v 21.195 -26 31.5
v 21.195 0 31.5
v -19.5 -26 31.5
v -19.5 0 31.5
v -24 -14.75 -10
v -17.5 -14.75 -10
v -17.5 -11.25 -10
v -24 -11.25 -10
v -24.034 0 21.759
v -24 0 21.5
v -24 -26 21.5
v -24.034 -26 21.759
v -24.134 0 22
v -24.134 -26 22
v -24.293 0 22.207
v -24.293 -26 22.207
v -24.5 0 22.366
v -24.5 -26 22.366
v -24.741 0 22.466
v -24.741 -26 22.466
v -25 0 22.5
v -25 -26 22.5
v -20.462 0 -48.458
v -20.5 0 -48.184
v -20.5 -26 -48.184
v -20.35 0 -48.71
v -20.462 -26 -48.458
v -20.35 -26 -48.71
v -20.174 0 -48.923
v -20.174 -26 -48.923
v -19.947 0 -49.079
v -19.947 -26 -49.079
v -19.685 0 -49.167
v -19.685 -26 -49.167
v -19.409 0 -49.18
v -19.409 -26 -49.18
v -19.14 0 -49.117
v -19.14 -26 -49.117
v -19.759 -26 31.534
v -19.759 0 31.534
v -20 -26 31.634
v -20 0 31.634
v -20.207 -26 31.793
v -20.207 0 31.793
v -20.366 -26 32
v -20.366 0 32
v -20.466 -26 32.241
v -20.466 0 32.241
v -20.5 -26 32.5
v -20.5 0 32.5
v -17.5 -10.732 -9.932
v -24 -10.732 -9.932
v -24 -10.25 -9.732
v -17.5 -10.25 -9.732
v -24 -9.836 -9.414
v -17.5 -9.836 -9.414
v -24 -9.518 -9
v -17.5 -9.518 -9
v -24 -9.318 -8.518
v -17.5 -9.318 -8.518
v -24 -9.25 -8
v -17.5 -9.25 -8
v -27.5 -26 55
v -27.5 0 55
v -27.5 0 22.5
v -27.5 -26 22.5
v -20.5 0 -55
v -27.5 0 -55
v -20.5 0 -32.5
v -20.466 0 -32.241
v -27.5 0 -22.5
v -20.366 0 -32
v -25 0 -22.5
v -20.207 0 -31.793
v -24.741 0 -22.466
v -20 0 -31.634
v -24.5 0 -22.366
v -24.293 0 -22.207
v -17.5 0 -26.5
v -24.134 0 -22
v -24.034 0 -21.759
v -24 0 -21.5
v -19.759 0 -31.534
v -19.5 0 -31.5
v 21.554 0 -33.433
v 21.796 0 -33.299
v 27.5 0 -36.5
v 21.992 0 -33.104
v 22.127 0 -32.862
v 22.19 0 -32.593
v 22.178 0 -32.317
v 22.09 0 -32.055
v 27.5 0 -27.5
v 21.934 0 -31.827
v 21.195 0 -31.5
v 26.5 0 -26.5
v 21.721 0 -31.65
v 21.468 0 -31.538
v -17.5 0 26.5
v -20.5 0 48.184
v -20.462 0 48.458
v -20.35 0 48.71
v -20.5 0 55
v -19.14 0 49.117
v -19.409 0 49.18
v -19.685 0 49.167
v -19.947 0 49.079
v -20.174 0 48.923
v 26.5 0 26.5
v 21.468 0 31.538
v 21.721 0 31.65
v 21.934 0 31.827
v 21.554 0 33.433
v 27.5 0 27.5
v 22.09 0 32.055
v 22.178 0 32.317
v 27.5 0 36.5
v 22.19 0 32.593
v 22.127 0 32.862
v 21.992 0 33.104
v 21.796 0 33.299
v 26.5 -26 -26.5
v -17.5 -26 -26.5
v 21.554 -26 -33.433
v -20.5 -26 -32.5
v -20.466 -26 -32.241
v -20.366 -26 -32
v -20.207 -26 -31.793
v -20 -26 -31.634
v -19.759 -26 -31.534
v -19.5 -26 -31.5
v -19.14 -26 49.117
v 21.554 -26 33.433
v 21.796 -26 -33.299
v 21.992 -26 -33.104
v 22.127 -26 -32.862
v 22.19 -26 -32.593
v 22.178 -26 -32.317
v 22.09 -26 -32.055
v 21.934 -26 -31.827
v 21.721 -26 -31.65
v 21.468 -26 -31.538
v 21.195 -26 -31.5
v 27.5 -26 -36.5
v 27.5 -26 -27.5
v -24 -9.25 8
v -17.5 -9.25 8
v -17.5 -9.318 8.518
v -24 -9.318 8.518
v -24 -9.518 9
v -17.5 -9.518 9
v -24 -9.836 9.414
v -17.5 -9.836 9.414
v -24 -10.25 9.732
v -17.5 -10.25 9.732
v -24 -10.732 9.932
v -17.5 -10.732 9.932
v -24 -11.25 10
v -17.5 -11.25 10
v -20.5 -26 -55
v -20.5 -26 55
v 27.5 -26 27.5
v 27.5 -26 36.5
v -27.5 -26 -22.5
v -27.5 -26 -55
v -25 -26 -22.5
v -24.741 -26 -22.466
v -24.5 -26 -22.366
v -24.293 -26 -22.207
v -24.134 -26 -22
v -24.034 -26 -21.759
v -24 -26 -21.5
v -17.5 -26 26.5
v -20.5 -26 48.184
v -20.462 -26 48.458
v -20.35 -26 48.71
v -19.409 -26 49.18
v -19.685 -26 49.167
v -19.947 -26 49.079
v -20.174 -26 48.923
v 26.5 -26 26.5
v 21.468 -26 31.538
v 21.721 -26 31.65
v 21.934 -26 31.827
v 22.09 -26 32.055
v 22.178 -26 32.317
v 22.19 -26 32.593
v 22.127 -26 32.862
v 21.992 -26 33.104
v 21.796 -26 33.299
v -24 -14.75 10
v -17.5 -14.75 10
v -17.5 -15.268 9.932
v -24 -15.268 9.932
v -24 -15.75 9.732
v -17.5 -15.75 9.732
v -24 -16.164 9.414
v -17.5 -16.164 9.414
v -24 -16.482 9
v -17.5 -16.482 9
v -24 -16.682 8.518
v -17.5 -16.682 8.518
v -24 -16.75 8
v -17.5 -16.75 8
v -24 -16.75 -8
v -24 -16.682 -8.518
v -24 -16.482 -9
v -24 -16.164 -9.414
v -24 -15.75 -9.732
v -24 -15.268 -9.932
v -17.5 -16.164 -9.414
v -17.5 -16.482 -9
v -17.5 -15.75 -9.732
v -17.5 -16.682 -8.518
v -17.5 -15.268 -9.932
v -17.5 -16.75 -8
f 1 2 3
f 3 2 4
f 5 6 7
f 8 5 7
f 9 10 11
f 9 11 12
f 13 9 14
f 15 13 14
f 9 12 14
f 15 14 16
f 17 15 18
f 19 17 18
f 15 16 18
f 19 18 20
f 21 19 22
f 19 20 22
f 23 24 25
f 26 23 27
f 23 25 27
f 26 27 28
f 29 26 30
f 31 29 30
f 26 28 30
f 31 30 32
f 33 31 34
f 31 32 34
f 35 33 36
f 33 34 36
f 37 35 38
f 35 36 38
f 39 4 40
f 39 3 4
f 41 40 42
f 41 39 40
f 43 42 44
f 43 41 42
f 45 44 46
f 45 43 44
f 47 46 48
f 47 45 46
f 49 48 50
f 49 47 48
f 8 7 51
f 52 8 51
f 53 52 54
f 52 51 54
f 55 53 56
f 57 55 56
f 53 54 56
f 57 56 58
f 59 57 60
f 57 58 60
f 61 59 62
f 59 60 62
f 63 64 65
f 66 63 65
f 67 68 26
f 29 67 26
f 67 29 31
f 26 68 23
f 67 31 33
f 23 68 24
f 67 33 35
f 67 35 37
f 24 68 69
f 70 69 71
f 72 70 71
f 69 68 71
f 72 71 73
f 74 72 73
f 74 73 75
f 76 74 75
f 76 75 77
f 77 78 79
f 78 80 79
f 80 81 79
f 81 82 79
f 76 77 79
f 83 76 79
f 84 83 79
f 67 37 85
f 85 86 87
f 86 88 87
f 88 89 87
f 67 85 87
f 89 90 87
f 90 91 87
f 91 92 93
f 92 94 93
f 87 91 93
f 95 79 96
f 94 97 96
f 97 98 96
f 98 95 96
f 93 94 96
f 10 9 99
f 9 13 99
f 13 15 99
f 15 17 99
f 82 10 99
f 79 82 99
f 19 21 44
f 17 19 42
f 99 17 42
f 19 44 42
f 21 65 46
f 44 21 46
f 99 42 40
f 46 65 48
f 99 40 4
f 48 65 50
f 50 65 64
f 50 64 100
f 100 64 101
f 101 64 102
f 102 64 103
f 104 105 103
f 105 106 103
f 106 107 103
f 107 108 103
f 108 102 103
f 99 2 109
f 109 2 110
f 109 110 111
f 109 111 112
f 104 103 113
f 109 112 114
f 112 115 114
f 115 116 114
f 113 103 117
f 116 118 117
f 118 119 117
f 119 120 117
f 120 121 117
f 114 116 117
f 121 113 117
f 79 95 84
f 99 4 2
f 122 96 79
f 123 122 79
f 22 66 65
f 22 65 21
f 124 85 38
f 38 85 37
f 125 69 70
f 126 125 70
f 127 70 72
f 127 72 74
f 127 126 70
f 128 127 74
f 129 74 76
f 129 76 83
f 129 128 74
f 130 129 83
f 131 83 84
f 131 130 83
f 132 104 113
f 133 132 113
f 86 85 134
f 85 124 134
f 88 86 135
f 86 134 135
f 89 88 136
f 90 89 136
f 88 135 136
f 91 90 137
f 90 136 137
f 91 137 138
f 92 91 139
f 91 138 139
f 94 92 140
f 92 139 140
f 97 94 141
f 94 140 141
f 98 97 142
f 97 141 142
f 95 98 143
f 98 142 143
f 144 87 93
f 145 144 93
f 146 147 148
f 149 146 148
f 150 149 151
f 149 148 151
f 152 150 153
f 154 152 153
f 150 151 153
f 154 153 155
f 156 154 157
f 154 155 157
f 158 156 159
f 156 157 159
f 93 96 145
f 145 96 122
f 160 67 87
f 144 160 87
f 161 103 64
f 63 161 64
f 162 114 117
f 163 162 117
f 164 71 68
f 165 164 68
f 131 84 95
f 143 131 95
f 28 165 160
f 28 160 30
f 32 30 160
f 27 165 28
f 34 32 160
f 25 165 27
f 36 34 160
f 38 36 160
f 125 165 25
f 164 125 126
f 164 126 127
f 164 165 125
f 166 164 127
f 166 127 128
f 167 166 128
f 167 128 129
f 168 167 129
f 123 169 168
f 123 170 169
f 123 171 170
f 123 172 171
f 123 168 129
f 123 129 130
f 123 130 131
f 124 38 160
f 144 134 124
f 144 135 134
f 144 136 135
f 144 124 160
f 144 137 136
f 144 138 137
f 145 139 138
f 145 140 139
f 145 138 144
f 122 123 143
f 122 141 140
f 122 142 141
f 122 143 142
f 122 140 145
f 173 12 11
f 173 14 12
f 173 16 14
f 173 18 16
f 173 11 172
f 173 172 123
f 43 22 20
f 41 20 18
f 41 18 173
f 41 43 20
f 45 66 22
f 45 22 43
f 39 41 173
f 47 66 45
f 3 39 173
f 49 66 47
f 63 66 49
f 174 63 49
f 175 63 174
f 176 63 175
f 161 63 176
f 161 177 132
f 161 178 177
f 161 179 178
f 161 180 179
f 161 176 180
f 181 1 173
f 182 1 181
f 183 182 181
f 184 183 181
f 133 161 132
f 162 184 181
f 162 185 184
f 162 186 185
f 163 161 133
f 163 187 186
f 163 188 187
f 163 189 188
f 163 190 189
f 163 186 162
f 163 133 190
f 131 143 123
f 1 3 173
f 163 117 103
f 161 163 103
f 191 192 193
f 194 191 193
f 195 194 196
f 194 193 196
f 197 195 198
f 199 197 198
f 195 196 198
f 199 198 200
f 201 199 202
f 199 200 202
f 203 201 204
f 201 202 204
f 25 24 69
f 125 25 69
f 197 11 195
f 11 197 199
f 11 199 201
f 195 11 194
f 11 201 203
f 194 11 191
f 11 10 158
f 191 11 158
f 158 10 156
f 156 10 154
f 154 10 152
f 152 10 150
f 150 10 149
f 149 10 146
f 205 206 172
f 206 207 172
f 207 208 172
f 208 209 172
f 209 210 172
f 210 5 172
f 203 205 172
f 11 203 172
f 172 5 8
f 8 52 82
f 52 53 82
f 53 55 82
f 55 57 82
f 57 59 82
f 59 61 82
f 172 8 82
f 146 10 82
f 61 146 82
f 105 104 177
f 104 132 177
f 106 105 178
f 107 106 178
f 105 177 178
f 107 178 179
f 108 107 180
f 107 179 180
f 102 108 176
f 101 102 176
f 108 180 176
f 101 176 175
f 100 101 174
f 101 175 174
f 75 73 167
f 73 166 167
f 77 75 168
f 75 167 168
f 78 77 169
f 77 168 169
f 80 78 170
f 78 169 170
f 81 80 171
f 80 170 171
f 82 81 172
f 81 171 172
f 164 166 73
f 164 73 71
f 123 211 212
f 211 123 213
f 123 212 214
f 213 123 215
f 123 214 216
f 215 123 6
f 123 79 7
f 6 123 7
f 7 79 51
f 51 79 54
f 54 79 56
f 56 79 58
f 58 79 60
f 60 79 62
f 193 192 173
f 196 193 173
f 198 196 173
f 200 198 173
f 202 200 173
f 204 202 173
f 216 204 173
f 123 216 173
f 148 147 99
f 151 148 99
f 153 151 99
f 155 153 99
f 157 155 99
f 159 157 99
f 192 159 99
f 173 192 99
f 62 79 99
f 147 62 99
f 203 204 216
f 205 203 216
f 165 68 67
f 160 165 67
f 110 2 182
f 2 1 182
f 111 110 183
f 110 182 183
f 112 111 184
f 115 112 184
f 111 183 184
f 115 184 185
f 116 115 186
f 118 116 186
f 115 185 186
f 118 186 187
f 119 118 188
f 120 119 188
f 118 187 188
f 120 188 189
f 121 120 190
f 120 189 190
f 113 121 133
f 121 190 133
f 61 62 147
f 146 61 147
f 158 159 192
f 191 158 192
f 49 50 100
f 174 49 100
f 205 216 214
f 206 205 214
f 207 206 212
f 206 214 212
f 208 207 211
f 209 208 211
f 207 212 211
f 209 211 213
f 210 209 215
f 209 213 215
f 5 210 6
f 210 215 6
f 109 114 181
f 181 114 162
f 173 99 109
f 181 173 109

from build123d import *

# Parameters (mm, degrees)
F1_DEPTH = 26
F2_R     = 1
F3_SIZE  = 1
F5_DEPTH = 6.5


with BuildPart() as f1:
    # F0 (on Front) → F1 (new body)
    with BuildSketch(Plane.XZ):
        Polygon((-27.5, -55), (-20.5, -55), (27.5, -36.5), (27.5, -26.5), (-17.5, -26.5), (-17.5, 26.5), (27.5, 26.5), (27.5, 36.5), (-20.5, 55), (-27.5, 55), (-27.5, 22.5), (-24, 22.5), (-24, -22.5), (-27.5, -22.5), align=None)
        Polygon((-20.5, -31.5), (26.5698068675, -31.5), (-20.5, -49.6414880635), align=None, mode=Mode.SUBTRACT)
        Polygon((-20.5, 31.5), (-20.5, 49.6414880635), (26.5698068675, 31.5), align=None, mode=Mode.SUBTRACT)
    extrude(amount=F1_DEPTH)

    # F2
    f2_edges = [f1.edges().sort_by_distance(p)[0] for p in [
        (-20.5, -13, 49.641488),
        (-20.5, -13, 31.5),
        (26.569807, -13, 31.5),
        (26.569807, -13, -31.5),
        (-20.5, -13, -31.5),
        (-20.5, -13, -49.641488),
        (-24, -13, -22.5),
        (-24, -13, 22.5),
    ]]
    fillet(f2_edges, radius=F2_R)

    # F3
    f3_edges = [f1.edges().sort_by_distance(p)[0] for p in [
        (27.5, -13, -26.5),
        (27.5, -13, 26.5),
    ]]
    chamfer(f3_edges, length=F3_SIZE)

    # F4 (on face) → F5 (cut, through all)
    with BuildSketch(Plane.YZ.offset(-17.5)):
        with BuildLine():
            ThreePointArc((-9.25, 8), (-9.8357864376, 9.4142135624), (-11.25, 10))
            Line((-11.25, 10), (-14.75, 10))
            ThreePointArc((-14.75, 10), (-16.1642135624, 9.4142135624), (-16.75, 8))
            Line((-16.75, 8), (-16.75, -8))
            ThreePointArc((-16.75, -8), (-16.1642135624, -9.4142135624), (-14.75, -10))
            Line((-14.75, -10), (-11.25, -10))
            ThreePointArc((-11.25, -10), (-9.8357864376, -9.4142135624), (-9.25, -8))
            Line((-9.25, -8), (-9.25, 8))
        make_face()
    extrude(amount=-F5_DEPTH, mode=Mode.SUBTRACT)


solid = f1.part
